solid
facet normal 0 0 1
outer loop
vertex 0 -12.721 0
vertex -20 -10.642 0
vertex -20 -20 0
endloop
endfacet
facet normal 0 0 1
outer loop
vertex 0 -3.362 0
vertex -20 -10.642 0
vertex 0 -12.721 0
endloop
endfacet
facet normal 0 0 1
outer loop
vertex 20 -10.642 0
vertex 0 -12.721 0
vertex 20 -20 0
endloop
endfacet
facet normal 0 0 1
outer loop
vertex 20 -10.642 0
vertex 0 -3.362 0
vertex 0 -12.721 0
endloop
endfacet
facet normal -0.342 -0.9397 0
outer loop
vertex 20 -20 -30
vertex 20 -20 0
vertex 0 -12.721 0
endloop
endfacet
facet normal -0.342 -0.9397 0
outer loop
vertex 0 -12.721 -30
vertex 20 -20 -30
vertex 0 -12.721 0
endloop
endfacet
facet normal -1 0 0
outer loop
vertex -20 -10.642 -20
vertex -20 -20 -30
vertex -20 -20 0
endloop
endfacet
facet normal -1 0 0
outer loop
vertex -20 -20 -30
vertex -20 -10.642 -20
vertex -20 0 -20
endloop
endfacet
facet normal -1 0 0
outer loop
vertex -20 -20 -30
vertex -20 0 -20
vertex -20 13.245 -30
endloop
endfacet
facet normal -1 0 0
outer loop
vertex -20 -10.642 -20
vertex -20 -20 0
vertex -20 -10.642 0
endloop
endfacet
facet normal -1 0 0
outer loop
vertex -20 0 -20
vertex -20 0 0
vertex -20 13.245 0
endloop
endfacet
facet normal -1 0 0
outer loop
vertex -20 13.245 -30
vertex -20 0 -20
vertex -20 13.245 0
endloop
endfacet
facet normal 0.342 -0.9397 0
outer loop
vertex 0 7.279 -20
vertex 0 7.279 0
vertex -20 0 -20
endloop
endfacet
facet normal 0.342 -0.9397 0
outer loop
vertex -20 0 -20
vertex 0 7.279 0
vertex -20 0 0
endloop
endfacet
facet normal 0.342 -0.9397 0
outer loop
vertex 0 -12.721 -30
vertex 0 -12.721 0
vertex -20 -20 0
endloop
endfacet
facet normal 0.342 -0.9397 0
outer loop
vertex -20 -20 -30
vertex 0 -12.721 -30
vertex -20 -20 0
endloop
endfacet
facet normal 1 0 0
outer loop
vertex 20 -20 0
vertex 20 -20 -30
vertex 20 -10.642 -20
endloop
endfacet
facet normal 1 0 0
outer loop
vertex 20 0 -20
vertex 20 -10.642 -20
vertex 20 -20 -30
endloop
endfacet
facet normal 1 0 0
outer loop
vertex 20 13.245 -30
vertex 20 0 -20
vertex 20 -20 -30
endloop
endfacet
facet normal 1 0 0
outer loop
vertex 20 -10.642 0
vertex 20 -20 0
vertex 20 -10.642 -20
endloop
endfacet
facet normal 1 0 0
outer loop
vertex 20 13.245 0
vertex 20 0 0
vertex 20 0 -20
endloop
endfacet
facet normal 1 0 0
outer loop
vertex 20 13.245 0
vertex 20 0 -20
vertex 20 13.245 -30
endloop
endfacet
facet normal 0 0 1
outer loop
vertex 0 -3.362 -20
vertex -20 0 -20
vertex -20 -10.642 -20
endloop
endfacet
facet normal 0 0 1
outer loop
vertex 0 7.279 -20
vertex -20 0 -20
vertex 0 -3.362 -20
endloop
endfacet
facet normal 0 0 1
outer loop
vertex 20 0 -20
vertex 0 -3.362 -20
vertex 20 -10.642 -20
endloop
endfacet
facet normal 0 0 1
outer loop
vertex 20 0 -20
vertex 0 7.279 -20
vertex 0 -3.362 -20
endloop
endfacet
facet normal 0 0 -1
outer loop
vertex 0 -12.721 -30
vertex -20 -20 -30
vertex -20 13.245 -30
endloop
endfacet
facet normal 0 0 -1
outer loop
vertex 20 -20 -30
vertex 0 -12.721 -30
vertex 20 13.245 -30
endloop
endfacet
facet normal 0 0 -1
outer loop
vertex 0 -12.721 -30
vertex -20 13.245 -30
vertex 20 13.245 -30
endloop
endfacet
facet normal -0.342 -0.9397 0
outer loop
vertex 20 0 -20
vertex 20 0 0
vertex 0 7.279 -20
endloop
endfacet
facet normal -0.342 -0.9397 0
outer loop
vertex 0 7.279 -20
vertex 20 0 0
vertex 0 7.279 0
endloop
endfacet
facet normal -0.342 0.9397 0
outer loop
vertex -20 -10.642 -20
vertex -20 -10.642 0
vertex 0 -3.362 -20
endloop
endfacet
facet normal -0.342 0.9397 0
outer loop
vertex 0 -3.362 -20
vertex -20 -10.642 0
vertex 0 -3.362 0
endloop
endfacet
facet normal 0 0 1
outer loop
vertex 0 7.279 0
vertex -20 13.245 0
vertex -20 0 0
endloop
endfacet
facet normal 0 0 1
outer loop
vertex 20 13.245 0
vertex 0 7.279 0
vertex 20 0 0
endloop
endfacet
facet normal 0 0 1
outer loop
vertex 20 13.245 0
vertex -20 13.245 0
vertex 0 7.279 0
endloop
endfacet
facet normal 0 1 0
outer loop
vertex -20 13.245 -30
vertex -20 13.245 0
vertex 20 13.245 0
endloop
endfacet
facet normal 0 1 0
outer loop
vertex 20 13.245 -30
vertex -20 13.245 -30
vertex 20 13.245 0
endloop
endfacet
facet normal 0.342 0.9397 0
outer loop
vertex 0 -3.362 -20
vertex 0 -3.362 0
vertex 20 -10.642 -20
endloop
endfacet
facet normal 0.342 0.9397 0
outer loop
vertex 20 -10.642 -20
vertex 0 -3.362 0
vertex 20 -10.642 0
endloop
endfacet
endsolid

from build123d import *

# Parameters (mm, degrees)
F0_W     = 40
F0_H     = 40
F1_DEPTH = 30
F3_DEPTH = 20
F2_W     = 40
F2_H     = 6.755145
F4_DEPTH = 30.001


with BuildPart() as f1:
    # F0 (on Top) → F1 (new body)
    with BuildSketch(Plane.XY):
        Rectangle(F0_W, F0_H)
    extrude(amount=-F1_DEPTH)

    # F2 (on face) → F3 (cut)
    with BuildSketch(Plane.XY):
        Polygon((20, -10.641778), (20, 0), (0, 7.279405), (-20, 0), (-20, -10.641778), (0, -3.362373), align=None)
    extrude(amount=-F3_DEPTH, mode=Mode.SUBTRACT)

    # F2 (on face) → F4 (cut, through all)
    with BuildSketch(Plane.XY):
        Polygon((-20, -20), (20, -20), (0, -12.720595), align=None)
        with Locations((0, 16.622428)):
            Rectangle(F2_W, F2_H)
    extrude(amount=-F4_DEPTH, mode=Mode.SUBTRACT)


solid = f1.part
